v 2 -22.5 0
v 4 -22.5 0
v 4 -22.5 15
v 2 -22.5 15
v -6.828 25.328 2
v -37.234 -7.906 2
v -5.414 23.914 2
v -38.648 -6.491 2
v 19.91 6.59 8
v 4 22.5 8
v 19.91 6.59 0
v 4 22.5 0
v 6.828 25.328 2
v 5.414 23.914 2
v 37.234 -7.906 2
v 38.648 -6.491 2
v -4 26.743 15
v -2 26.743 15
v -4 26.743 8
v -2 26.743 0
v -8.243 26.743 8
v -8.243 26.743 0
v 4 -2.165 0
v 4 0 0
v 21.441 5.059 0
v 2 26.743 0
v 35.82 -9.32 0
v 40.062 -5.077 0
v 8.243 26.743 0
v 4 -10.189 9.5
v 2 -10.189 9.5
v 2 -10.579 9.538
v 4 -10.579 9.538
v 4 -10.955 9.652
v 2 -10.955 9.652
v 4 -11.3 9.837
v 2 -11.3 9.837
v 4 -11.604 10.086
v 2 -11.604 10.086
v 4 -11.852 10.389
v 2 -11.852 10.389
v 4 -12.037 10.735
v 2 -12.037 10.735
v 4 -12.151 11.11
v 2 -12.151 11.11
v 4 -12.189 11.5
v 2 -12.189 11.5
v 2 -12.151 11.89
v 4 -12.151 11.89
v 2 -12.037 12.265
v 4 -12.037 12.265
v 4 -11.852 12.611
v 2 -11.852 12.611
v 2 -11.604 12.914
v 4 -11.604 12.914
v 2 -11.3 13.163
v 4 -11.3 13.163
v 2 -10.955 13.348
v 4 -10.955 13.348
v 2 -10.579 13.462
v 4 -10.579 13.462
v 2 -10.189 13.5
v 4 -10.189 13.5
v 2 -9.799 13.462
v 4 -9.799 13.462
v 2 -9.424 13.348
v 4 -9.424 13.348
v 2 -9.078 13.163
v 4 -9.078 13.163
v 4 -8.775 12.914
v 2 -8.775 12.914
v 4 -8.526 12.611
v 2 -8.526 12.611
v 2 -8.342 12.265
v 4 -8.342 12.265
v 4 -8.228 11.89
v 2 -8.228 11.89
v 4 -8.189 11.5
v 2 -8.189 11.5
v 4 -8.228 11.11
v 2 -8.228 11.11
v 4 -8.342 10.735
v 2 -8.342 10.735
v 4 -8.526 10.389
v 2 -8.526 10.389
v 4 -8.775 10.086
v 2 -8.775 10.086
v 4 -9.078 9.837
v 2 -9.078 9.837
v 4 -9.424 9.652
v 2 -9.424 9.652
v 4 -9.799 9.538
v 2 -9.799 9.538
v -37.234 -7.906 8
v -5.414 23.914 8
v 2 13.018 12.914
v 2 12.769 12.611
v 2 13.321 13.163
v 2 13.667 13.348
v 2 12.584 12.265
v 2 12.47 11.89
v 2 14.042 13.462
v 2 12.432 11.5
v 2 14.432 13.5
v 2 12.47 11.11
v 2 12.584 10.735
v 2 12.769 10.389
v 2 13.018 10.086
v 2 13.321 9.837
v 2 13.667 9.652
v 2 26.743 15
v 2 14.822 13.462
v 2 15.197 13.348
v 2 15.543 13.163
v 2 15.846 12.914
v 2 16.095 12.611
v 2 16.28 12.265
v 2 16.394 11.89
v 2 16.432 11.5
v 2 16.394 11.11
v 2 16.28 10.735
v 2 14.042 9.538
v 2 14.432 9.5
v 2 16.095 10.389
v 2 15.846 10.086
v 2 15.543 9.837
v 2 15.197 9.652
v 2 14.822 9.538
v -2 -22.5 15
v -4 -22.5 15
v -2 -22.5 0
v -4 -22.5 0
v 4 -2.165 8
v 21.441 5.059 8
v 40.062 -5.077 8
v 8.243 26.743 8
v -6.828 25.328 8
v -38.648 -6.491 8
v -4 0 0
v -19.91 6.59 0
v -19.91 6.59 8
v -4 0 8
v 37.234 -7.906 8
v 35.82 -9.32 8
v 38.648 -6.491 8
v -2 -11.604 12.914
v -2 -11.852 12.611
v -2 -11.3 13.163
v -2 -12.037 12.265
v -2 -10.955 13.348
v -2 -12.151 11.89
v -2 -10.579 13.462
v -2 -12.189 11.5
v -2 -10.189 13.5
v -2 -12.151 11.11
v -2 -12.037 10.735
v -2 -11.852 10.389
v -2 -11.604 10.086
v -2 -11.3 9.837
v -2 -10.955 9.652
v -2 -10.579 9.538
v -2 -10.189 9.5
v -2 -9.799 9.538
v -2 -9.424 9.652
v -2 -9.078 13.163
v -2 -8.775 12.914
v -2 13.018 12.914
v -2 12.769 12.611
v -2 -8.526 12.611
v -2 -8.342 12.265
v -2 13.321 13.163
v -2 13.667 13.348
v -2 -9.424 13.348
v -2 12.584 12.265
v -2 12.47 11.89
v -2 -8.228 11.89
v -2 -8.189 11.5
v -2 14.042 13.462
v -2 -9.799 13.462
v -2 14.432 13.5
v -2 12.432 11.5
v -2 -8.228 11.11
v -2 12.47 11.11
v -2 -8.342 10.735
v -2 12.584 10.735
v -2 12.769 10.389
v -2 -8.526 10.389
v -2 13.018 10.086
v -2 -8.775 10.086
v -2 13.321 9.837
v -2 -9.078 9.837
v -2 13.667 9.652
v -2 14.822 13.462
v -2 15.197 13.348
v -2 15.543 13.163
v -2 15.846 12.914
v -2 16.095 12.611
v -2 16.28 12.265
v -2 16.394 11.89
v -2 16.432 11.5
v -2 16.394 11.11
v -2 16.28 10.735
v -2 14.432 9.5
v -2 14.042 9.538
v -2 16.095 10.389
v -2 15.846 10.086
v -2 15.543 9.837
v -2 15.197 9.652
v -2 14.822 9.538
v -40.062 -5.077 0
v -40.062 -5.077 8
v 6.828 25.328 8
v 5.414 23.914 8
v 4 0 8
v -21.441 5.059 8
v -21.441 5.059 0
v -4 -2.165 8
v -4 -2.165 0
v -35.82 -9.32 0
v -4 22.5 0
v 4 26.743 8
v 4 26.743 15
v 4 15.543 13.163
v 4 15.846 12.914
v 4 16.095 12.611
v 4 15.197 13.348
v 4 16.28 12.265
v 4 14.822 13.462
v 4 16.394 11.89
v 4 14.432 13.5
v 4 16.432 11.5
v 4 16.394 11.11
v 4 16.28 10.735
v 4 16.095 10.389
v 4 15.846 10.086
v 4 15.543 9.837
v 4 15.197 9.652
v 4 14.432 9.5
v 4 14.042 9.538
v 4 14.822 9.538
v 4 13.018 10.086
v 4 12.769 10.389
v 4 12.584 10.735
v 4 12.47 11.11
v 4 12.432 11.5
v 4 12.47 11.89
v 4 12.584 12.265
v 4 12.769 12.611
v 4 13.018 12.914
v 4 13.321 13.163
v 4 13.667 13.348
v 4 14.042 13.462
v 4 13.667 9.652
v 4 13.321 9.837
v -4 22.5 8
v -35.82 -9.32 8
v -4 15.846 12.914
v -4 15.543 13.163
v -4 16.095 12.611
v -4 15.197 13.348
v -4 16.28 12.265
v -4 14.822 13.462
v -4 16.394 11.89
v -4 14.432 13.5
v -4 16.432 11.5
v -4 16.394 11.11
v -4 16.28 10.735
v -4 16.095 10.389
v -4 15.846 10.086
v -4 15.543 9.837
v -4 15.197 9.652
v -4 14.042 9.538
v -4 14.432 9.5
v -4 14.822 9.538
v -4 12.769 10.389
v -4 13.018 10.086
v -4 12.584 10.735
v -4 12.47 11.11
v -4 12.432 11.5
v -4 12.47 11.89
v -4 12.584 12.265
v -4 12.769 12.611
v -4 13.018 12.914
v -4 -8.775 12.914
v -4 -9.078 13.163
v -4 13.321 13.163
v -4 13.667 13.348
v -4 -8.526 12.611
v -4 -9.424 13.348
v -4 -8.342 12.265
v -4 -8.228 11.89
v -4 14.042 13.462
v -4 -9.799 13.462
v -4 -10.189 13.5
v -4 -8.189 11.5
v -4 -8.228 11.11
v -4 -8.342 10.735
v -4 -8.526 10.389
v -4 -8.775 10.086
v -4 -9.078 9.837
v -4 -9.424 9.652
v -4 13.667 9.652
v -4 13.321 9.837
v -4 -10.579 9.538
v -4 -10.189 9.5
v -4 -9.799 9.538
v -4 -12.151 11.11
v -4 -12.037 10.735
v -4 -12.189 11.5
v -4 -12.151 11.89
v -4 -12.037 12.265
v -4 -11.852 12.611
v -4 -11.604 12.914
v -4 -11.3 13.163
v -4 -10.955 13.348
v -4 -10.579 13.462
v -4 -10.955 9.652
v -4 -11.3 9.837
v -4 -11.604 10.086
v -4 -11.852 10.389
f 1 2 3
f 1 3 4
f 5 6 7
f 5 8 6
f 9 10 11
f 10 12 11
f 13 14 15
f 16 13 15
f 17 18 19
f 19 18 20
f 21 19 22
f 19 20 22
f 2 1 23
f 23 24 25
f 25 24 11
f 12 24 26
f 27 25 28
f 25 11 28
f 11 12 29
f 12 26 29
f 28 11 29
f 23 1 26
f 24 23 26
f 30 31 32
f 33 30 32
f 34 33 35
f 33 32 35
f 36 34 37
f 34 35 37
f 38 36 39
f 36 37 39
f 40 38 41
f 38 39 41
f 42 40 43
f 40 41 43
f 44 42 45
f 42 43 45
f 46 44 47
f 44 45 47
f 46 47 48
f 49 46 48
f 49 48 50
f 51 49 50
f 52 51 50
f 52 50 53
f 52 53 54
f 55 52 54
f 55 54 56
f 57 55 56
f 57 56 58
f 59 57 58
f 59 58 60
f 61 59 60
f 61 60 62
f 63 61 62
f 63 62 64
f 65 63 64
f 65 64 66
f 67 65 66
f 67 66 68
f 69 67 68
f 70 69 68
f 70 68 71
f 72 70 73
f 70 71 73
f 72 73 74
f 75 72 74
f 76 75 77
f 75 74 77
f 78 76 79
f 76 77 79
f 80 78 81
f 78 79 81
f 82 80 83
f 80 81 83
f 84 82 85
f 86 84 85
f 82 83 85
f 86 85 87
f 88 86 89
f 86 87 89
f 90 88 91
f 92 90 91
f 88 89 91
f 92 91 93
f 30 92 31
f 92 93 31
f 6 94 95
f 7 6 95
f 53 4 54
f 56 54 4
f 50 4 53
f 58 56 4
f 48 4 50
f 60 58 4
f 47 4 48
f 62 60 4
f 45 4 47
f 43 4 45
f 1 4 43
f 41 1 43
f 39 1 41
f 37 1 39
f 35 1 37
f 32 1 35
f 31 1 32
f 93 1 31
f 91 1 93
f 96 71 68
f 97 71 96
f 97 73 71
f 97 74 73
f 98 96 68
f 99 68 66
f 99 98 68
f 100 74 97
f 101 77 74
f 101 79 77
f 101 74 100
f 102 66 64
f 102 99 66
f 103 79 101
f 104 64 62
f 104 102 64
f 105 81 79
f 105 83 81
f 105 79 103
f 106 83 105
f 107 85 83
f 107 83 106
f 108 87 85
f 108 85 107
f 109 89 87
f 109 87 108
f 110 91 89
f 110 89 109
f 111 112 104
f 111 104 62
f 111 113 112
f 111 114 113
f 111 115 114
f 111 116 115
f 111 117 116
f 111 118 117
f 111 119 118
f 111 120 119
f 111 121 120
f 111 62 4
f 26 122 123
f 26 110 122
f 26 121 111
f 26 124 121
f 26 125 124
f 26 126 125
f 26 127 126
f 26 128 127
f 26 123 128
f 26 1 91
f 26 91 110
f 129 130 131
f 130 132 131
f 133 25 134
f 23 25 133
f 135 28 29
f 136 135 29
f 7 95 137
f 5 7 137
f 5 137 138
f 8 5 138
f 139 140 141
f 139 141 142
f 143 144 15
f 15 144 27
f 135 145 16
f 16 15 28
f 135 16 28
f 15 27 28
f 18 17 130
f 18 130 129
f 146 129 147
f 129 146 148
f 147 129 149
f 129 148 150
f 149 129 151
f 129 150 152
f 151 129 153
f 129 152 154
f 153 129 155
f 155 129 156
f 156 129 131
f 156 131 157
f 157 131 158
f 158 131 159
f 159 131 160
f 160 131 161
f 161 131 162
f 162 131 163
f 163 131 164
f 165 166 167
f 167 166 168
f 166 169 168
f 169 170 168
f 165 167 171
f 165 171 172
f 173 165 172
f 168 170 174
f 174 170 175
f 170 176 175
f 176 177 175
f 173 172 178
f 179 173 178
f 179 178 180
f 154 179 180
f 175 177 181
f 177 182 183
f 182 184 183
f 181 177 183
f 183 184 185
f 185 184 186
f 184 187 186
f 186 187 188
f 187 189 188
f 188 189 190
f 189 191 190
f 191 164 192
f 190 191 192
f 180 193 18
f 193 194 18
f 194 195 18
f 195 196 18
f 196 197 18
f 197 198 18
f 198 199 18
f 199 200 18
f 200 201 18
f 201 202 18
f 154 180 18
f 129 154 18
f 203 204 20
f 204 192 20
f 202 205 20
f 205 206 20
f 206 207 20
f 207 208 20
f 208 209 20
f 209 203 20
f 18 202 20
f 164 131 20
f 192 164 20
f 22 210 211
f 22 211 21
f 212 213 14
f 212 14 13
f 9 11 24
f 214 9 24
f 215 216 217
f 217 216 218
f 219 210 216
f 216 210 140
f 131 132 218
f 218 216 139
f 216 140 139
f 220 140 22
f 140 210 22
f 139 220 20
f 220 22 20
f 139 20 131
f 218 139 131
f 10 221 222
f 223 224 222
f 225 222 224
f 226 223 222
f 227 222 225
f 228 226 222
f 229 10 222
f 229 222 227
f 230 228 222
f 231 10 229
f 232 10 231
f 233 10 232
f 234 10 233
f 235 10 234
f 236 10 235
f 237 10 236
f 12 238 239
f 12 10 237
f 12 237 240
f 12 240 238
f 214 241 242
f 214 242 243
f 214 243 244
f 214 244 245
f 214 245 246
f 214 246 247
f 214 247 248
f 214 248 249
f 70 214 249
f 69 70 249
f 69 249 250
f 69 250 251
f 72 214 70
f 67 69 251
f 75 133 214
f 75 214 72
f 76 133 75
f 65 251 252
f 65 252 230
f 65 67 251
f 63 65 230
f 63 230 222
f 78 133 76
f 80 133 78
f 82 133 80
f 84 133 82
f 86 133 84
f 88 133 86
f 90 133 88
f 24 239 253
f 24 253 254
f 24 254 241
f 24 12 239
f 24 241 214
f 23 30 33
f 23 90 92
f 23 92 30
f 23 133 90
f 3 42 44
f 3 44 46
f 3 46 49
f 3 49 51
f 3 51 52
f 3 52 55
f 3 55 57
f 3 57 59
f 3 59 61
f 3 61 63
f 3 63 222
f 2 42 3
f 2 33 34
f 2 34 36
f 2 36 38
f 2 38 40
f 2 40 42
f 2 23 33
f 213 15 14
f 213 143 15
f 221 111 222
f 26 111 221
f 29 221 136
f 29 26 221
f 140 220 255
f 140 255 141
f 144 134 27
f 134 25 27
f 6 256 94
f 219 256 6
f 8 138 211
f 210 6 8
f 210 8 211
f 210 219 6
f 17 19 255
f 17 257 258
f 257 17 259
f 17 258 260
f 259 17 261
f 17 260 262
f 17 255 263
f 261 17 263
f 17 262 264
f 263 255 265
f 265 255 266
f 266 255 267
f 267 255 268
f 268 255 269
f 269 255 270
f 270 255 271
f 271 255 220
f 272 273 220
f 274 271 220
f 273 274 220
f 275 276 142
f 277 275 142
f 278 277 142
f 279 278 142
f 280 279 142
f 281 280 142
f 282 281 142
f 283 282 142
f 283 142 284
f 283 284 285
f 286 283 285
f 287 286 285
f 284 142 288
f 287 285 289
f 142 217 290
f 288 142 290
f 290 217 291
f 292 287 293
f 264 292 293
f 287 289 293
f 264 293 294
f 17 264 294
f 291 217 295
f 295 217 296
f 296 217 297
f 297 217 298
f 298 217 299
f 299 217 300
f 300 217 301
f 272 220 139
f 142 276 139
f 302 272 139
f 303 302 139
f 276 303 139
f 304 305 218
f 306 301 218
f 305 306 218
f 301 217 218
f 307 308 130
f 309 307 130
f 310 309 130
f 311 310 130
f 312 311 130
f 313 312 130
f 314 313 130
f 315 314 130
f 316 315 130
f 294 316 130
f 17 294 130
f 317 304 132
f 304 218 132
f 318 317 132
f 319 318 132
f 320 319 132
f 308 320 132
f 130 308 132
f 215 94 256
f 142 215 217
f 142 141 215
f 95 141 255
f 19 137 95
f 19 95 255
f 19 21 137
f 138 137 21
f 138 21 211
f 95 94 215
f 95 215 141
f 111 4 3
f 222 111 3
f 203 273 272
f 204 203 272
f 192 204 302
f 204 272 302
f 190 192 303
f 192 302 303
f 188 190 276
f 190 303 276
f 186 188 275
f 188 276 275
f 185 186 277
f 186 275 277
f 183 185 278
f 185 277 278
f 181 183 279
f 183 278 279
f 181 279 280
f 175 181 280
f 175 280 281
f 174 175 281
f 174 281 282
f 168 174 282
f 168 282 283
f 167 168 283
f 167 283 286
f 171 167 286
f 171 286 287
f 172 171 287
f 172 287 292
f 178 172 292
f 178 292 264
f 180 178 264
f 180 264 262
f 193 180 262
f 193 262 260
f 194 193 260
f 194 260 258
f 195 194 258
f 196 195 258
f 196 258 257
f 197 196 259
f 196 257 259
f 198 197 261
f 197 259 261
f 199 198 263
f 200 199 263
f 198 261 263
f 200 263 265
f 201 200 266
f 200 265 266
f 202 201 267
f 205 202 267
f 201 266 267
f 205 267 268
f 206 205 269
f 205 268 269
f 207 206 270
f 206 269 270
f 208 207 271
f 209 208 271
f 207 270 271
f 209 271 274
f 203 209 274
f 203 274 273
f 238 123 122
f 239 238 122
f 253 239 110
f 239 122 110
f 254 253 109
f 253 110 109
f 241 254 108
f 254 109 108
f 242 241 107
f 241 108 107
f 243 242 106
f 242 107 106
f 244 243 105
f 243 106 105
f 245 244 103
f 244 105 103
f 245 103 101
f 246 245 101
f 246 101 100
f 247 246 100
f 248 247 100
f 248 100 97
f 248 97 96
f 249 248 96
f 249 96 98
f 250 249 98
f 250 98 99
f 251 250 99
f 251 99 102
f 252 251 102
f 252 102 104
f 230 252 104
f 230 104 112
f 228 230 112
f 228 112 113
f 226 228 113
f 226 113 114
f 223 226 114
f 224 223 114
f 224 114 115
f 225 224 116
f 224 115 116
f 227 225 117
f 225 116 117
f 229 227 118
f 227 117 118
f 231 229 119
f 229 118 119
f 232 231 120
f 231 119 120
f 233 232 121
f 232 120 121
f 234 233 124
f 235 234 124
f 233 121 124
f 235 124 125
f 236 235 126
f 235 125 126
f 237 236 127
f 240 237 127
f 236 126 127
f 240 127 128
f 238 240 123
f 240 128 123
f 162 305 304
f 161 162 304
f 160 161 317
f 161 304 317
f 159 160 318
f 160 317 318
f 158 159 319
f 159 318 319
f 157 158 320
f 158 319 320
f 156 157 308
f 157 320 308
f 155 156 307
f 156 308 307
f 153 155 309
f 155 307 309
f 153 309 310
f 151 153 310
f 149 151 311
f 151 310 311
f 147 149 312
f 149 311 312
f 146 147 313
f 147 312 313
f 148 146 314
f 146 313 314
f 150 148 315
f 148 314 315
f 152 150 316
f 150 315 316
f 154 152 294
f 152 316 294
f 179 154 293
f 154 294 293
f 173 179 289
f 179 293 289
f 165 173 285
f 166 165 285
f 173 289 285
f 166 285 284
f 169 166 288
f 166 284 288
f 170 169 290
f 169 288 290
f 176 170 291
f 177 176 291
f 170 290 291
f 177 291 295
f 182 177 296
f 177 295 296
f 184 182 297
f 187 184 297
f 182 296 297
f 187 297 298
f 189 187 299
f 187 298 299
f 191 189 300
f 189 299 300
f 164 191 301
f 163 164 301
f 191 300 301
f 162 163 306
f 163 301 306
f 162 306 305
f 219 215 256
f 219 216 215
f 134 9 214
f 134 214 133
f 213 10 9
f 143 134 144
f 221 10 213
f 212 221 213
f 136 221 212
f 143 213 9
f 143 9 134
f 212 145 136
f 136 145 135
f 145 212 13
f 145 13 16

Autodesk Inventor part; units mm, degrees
ref_plane "YZ Plane" through (0, 0, 0) normal (1, 0, 0) x (0, 1, 0)
ref_plane "XZ Plane" through (0, 0, 0) normal (0, 1, 0) x (-1, 0, 0)
ref_plane "XY Plane" through (0, 0, 0) normal (0, 0, 1) x (1, 0, 0)
sketch "support_base" plane through (0, 0, 0) normal (0, 0, 1) x (1, 0, 0)
  line L0 (-24.7251, -5.2251) -> (20.2749, -5.2251)
  line L1 (20.2749, -5.2251) -> (20.2749, 0.7749)
  line L2 (20.2749, 0.7749) -> (-24.7251, 0.7749)
  line L3 (-24.7251, 0.7749) -> (-24.7251, -5.2251)
  line L4 (-24.7251, -5.2251) -> (20.2749, 0.7749) construction
  line L5 (20.2749, -5.2251) -> (-24.7251, 0.7749) construction
  line L6 (20.2749, 0.7749) -> (-11.5449, 32.5947)
  line L7 (-11.5449, 32.5947) -> (-10.1307, 34.009)
  line L8 (-10.1307, 34.009) -> (21.6892, 2.1892)
  line L9 (21.6892, 2.1892) -> (20.2749, 0.7749)
  line L10 (21.6892, 2.1892) -> (24.6892, -0.8108)
  line L11 (24.6892, -0.8108) -> (20.2749, -5.2251)
  line L12 (-2.2251, 0.7749) -> (4.365, 16.6848)
  line L13 (-4.3898, 0.7749) -> (2.8343, 18.2156)
  point P0 (4.5036, 7.635)
  point P1 (-2.2251, -2.2251)
  point P2 (-2.2251, -2.2251)
  dimension "d65" = 45
  dimension "d66" = 2
  dimension "d67" = 45
  dimension "d68" = 6
  dimension "d69" = 2
sketch "Sketch11" plane through (0, 0, 0) normal (0, 0, 1) x (1, 0, 0)
  line L0 (0, 4) -> (0, -4) construction
  line L1 (2, 0) -> (0, 0) construction
  line L2 (40.0624, -5.0772) -> (8.2426, 26.7426)
  line L3 (8.2426, 26.7426) -> (4, 22.5)
  line L4 (4, 22.5) -> (35.8198, -9.3198)
  line L5 (35.8198, -9.3198) -> (40.0624, -5.0772)
  line L6 (40.0624, -5.0772) -> (4, 22.5) construction
  line L7 (8.2426, 26.7426) -> (35.8198, -9.3198) construction
  line L8 (4, 22.5) -> (4, -22.5)
  line L9 (4, -22.5) -> (2, -22.5)
  line L10 (2, -22.5) -> (2, 22.5)
  line L11 (2, 22.5) -> (4, 22.5)
  line L12 (2, 22.5) -> (2, 26.7426)
  line L13 (2, 26.7426) -> (8.2426, 26.7426)
  line L14 (19.9099, 6.5901) -> (4, 0)
  line L15 (21.4406, 5.0594) -> (4, -2.1648)
  line L16 (-40.0624, -5.0772) -> (-8.2426, 26.7426)
  line L17 (-8.2426, 26.7426) -> (-4, 22.5)
  line L18 (-4, 22.5) -> (-35.8198, -9.3198)
  line L19 (-35.8198, -9.3198) -> (-40.0624, -5.0772)
  line L20 (-40.0624, -5.0772) -> (-4, 22.5) construction
  line L21 (-8.2426, 26.7426) -> (-35.8198, -9.3198) construction
  line L22 (-4, 22.5) -> (-4, -22.5)
  line L23 (-4, -22.5) -> (-2, -22.5)
  line L24 (-2, -22.5) -> (-2, 22.5)
  line L25 (-2, 22.5) -> (-4, 22.5)
  line L26 (-2, 22.5) -> (-2, 26.7426)
  line L27 (-2, 26.7426) -> (-8.2426, 26.7426)
  line L28 (-19.9099, 6.5901) -> (-4, 0)
  line L29 (-21.4406, 5.0594) -> (-4, -2.1648)
  point P0 (2, 0)
  dimension "d80" = 2
  dimension "d81" = 8
extrude "Extrusion10" add sketch "Sketch11" along normal blind 8 contours L5 L4 L3 L2 | L3 L11 L12 L13 | L8 L9 L10 L11 | L15 L8 L14 L4 | L16 L17 L18 L19 | L27 L26 L25 L17 | L25 L24 L23 L22 | L18 L28 L22 L29
sketch "Sketch12" plane through (0, 0, 8) normal (0, 0, 1) x (1, 0, 0)
  line L0 (0, 28.3324) -> (0, -28.3324) construction
  line L1 (2, -22.5) -> (4, -22.5) construction
  line L2 (4, -22.5) -> (4, -2.1648) construction
  line L3 (4, -2.1648) -> (21.4406, 5.0594) construction
  line L4 (21.4406, 5.0594) -> (35.8198, -9.3198) construction
  line L5 (35.8198, -9.3198) -> (40.0624, -5.0772) construction
  line L6 (40.0624, -5.0772) -> (8.2426, 26.7426) construction
  line L7 (8.2426, 26.7426) -> (2, 26.7426) construction
  line L8 (2, 26.7426) -> (2, -22.5) construction
  line L9 (4, 22.5) -> (19.9099, 6.5901) construction
  line L10 (19.9099, 6.5901) -> (4, 0) construction
  line L11 (4, 0) -> (4, 22.5) construction
  line L12 (2, -22.5) -> (2, 26.7426)
  line L13 (2, 26.7426) -> (4, 26.7426)
  line L14 (4, 26.7426) -> (4, -22.5)
  line L15 (4, -22.5) -> (2, -22.5)
  line L16 (4, 0) -> (4, 22.5) projected
  line L17 (2, 26.7426) -> (2, -22.5) projected
  line L18 (2, -22.5) -> (4, -22.5) projected
  line L19 (8.2426, 26.7426) -> (2, 26.7426) projected
  line L20 (-2, -22.5) -> (-2, 26.7426)
  line L21 (-2, 26.7426) -> (-4, 26.7426)
  line L22 (-4, 26.7426) -> (-4, -22.5)
  line L23 (-4, -22.5) -> (-2, -22.5)
  line L24 (35.8198, -9.3198) -> (40.0624, -5.0772) projected
  line L25 (38.6482, -6.4914) -> (37.234, -7.9056)
  line L26 (37.234, -7.9056) -> (5.4142, 23.9142)
  line L27 (5.4142, 23.9142) -> (6.8284, 25.3284)
  line L28 (6.8284, 25.3284) -> (38.6482, -6.4914)
  line L29 (40.0624, -5.0772) -> (8.2426, 26.7426) projected
  line L30 (8.2426, 26.7426) -> (4, 22.5) construction
  line L31 (-38.6482, -6.4914) -> (-37.234, -7.9056)
  line L32 (-37.234, -7.9056) -> (-5.4142, 23.9142)
  line L33 (-5.4142, 23.9142) -> (-6.8284, 25.3284)
  line L34 (-6.8284, 25.3284) -> (-38.6482, -6.4914)
  point P0 (0, 0)
  point P1 (0, 0)
  point P2 (37.9411, -7.1985)
  dimension "d75" = 2
extrude "Extrusion12" cut sketch "Sketch12" against normal blind 6 contours L26 L27 L28 L24 | L34 L33 L32 L31
extrude "Extrusion13" add sketch "Sketch12" along normal blind 15 from surface at -8 contours L12 L13 L14 L15 | L23 L22 L21 L20
sketch "Sketch13" plane through (4, 0, 0) normal (1, 0, 0) x (0, 0, -1)
  line L0 (-8, 26.7426) -> (-15, 26.7426) projected
  line L1 (0, -22.5) -> (-15, -22.5) projected
  line L2 (-15, 26.7426) -> (-15, -22.5) construction
  line L3 (-15, 2.1213) -> (-11.5, 2.1213) construction
  line L4 (-11.5, 2.1213) -> (-11.5, 26.7426) construction
  line L5 (-11.5, 2.1213) -> (-11.5, -22.5) construction
  point P0 (0, 0)
  point P1 (-11.5, 14.432)
  point P2 (-11.5, -10.1893)
hole "Hole1" at (4, 14.432, 11.5) at (4, -10.1893, 11.5) direction (-1, 0, 0) diameter 4 end through all
equation "\"d66\" = wall_t"
equation "\"d67\" = supp_h"
equation "\"d68\" = disp_t + 2 * wall_t"
equation "\"d69\" = wall_t"
equation "\"d80\" = wall_t"
equation "\"d81\" = 4 * wall_t"
equation "\"d70\" = disp_s + wall_t"
equation "\"d75\" = disp_t"
equation "\"d76\" = disp_s"
equation "\"d78\" = supp_b"
equation "\"d82\" = hole_d"
equation "\"wall_t\" = 2"
equation "\"disp_t\" = 2"
equation "\"supp_b\" = 15"
equation "\"disp_s\" = 6"
equation "\"supp_h\" = 45"
equation "\"hole_d\" = 4"
properties part number "coffee"
